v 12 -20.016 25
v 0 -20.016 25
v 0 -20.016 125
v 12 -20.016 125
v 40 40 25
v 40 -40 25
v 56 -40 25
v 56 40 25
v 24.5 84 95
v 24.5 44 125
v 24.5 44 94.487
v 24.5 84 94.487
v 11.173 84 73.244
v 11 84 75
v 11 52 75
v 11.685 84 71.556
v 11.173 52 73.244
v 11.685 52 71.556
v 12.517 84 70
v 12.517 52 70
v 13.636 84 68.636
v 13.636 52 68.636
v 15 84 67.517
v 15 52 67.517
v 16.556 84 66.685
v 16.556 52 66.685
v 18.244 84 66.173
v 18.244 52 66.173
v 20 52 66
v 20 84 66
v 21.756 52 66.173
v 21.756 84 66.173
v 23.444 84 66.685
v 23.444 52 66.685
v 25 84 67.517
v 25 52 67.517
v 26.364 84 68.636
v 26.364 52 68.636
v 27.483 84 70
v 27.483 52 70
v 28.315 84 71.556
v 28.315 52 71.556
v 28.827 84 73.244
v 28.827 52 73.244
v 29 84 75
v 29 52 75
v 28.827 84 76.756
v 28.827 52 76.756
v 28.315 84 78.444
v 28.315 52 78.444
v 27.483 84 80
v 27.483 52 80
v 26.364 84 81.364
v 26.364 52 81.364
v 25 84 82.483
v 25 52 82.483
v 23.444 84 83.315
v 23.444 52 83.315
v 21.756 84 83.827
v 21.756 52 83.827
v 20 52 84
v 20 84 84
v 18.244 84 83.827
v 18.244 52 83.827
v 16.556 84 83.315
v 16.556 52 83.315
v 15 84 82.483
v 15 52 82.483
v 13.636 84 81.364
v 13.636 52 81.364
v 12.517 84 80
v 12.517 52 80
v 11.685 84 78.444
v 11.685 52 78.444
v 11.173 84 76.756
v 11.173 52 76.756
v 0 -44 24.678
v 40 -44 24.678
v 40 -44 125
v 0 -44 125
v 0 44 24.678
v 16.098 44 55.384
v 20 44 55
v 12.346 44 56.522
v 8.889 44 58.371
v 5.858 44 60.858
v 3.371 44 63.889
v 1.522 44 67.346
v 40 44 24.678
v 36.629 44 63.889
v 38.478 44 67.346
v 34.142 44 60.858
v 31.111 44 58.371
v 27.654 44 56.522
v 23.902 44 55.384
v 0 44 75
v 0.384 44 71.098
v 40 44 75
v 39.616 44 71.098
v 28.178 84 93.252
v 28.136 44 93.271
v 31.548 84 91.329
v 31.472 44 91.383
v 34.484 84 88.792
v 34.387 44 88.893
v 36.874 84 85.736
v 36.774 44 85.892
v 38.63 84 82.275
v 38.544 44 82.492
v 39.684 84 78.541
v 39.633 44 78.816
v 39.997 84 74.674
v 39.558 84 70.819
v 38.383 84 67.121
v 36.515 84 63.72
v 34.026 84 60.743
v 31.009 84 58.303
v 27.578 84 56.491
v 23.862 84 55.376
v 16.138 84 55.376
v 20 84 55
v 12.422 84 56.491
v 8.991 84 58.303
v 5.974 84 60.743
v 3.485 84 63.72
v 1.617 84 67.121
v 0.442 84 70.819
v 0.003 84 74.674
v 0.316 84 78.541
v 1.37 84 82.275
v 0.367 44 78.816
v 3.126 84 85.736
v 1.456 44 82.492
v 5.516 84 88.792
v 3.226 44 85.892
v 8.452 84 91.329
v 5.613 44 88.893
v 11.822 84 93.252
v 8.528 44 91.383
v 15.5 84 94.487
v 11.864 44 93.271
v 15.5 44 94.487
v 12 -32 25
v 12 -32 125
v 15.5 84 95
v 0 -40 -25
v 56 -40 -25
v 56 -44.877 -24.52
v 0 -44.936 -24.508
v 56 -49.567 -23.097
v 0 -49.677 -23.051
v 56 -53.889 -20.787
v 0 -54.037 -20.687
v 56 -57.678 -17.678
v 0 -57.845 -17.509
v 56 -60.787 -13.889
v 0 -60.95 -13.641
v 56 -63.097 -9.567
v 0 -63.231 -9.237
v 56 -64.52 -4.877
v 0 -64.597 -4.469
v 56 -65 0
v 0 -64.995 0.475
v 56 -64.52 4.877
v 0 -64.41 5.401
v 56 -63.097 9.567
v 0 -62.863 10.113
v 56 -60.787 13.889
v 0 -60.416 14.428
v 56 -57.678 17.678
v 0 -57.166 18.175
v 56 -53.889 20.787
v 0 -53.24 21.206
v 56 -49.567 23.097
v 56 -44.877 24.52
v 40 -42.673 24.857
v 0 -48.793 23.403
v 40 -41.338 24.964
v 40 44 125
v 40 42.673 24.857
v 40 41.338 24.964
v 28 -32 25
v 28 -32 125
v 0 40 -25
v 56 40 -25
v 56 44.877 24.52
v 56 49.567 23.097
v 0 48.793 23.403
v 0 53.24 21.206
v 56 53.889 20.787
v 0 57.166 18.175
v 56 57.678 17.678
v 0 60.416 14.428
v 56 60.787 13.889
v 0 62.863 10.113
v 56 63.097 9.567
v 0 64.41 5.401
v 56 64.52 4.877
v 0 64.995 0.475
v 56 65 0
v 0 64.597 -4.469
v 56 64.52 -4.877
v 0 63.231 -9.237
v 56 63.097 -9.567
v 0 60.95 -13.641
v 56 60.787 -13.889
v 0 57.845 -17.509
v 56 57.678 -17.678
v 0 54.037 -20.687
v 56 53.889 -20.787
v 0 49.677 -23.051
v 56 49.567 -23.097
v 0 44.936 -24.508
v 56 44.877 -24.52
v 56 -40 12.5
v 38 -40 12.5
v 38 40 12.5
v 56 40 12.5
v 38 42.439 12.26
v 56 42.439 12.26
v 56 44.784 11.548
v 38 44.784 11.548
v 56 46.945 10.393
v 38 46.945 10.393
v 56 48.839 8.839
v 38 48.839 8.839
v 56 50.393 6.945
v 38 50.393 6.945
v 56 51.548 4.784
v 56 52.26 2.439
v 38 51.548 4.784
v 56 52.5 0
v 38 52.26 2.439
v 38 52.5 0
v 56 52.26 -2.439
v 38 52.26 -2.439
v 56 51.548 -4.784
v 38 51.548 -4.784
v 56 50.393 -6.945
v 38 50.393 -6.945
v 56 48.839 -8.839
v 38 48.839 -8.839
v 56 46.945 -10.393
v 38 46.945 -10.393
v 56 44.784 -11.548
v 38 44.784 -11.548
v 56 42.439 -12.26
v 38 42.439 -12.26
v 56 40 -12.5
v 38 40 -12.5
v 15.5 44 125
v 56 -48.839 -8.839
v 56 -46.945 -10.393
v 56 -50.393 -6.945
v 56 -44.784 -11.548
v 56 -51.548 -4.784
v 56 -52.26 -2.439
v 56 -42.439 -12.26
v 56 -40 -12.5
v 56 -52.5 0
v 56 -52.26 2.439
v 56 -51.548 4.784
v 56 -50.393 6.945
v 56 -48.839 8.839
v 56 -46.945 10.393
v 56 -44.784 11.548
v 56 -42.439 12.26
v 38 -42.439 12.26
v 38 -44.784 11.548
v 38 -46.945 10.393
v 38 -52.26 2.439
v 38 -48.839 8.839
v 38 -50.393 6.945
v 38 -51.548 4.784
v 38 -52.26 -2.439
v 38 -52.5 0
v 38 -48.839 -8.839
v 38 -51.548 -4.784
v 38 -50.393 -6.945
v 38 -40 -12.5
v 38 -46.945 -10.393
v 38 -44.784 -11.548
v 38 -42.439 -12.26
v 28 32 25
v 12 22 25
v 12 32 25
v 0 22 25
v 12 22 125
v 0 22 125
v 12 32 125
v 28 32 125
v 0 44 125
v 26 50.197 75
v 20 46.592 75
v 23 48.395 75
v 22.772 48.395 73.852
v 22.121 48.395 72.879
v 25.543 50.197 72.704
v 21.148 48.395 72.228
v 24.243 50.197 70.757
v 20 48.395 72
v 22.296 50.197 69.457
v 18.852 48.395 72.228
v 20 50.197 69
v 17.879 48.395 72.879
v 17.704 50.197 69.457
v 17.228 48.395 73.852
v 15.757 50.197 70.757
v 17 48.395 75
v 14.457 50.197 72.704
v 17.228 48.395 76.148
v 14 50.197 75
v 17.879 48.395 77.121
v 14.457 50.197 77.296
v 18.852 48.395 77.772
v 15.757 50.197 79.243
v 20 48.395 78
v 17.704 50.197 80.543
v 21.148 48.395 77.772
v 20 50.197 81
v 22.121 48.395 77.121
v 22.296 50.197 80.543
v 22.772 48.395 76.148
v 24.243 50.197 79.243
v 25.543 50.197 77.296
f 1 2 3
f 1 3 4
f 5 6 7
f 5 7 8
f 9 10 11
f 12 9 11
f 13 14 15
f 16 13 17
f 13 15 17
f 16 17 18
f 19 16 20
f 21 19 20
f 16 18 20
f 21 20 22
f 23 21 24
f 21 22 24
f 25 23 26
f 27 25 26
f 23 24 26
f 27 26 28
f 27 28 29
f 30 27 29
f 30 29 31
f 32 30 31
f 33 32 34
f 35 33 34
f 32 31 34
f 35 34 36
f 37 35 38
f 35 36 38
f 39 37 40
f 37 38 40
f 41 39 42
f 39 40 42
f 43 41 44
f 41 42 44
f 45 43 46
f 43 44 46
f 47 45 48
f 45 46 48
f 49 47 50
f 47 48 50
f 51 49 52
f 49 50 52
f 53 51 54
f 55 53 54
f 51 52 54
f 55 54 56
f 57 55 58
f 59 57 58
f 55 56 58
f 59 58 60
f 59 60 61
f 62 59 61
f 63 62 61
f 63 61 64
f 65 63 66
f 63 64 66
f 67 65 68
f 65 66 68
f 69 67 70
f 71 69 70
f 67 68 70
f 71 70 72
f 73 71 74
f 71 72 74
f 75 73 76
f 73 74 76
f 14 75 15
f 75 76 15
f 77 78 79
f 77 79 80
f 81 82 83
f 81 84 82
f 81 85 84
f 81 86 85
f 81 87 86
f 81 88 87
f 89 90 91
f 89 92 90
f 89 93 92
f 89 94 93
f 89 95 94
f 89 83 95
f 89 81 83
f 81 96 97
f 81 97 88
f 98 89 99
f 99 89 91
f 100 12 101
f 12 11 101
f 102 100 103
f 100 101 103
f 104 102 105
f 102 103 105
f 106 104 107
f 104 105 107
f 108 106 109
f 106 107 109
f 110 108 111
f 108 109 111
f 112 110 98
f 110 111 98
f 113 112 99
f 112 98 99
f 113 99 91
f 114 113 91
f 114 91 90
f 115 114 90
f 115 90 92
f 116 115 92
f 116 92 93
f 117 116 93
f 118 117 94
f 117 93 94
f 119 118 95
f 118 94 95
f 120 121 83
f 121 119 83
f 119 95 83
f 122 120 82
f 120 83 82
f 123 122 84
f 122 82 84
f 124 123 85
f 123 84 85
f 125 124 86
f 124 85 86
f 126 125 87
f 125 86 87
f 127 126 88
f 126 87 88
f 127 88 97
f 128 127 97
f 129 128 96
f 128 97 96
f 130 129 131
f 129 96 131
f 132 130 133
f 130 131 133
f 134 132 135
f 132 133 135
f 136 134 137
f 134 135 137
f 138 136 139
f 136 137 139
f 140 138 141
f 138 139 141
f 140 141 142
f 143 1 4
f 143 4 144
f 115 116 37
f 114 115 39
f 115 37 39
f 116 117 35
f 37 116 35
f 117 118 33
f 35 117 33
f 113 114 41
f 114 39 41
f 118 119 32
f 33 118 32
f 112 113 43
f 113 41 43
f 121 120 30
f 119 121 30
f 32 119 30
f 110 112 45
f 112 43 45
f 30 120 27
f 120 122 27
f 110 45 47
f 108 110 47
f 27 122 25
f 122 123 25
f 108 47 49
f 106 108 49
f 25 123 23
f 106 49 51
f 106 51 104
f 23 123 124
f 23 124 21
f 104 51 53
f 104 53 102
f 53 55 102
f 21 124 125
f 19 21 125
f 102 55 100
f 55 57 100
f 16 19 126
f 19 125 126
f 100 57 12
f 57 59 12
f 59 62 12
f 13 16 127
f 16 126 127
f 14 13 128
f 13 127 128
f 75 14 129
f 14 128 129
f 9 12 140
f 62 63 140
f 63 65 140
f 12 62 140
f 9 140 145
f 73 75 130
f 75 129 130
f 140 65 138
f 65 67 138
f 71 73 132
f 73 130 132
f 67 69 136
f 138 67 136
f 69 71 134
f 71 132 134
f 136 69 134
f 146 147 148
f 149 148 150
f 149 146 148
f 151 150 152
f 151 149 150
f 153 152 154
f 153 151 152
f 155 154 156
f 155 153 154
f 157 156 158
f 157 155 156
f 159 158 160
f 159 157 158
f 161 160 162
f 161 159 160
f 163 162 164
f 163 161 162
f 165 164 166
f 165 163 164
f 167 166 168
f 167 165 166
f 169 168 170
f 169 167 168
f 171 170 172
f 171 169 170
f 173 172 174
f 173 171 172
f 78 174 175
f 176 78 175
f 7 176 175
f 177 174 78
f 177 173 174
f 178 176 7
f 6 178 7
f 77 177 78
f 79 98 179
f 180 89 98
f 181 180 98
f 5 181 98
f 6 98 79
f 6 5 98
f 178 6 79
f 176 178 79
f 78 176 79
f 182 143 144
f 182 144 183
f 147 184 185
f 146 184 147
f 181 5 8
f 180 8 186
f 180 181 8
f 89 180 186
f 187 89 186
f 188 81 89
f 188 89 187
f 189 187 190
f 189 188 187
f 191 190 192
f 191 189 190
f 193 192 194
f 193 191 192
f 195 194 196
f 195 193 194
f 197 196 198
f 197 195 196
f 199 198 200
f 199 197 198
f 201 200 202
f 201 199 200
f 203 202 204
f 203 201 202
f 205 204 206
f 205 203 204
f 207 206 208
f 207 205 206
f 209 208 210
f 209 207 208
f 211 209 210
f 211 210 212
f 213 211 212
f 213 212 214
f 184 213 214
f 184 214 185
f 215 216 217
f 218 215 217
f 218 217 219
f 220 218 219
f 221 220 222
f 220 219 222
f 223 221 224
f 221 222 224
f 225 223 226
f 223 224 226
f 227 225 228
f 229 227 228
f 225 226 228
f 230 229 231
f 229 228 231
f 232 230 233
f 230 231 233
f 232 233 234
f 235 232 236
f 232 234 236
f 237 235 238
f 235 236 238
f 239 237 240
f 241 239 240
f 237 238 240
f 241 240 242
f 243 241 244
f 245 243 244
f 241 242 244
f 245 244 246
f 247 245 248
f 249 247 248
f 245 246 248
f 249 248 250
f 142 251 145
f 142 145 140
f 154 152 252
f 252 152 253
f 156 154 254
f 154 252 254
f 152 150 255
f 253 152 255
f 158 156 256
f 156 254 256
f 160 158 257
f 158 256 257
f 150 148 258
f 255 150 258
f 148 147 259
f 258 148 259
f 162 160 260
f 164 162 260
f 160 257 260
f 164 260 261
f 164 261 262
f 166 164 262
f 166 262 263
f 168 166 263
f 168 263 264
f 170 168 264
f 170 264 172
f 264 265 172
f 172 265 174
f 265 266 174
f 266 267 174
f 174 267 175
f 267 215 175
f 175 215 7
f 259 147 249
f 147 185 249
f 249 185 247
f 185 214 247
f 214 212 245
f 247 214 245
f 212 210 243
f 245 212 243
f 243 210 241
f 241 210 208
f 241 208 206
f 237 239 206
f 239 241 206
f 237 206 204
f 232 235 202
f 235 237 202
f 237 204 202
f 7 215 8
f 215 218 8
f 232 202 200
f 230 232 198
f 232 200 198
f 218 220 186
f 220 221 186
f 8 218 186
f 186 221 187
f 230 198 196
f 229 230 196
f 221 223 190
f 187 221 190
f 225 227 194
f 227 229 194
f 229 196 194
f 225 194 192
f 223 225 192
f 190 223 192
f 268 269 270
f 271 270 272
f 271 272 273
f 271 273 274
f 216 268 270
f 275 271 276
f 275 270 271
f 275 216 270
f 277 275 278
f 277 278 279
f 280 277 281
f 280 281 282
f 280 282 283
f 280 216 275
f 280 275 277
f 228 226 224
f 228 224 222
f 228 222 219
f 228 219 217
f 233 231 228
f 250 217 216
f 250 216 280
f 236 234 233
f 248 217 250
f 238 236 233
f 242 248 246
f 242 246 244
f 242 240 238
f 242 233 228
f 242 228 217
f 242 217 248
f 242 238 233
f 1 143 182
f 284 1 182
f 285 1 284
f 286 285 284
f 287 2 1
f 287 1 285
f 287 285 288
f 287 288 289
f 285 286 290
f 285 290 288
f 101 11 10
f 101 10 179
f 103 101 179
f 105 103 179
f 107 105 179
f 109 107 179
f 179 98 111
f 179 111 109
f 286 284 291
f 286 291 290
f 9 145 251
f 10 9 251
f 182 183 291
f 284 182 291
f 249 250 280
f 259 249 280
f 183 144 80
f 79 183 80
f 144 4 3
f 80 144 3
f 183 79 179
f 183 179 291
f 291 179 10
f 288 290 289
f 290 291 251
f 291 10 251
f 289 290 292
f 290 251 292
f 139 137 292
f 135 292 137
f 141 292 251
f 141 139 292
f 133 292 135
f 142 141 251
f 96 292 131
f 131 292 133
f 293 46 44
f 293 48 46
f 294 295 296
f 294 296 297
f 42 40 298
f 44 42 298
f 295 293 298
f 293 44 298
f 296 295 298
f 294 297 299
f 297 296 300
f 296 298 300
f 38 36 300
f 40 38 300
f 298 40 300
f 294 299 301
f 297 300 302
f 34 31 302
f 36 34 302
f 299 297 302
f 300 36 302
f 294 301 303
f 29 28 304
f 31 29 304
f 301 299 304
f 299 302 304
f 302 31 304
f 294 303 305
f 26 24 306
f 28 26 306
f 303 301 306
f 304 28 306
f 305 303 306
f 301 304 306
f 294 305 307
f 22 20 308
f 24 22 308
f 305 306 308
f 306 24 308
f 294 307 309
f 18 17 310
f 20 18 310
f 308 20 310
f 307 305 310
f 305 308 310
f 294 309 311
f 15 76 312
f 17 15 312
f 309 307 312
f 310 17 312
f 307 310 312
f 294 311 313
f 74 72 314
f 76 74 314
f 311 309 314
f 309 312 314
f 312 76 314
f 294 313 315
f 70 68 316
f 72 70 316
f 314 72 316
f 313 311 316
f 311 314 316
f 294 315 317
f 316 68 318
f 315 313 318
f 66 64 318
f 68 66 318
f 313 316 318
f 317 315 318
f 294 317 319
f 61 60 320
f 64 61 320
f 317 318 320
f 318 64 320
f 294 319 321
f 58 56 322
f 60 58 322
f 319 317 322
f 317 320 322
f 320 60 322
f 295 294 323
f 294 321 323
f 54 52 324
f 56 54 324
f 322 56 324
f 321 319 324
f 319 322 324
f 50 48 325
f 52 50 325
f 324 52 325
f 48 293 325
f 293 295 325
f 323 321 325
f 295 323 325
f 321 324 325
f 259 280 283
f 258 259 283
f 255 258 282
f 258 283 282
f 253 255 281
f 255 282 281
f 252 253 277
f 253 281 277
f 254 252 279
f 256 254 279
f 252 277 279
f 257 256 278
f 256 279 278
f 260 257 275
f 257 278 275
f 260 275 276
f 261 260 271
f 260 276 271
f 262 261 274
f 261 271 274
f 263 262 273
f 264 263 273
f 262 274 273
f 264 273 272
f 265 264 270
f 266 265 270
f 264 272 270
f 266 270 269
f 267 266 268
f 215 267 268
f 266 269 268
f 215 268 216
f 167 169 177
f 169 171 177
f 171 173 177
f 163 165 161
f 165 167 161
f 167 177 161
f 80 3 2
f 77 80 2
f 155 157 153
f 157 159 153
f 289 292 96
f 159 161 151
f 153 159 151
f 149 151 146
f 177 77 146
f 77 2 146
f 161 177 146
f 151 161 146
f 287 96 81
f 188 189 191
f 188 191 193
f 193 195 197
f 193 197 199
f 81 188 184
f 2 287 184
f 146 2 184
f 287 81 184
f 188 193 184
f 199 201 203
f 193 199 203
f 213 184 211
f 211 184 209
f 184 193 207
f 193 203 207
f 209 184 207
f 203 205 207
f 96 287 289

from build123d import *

# Parameters (mm, degrees)
BOSS_EXTRUDE1_DEPTH        = 56
BOSS_EXTRUDE2_DEPTH        = 38
BOSS_EXTRUDE3_START        = -0.322075
BOSS_EXTRUDE3_DEPTH        = 100.322075
SKETCH3_R                  = 20
BOSS_EXTRUDE4_DEPTH        = 40
RIB2_START                 = -4.5
RIB2_DEPTH                 = 9
F_10_0MM_DOWEL_HOLE1_D     = 18
F_10_0MM_DOWEL_HOLE1_DEPTH = 32
F_10_0MM_DOWEL_HOLE1_TIP   = 5.407745571


with BuildPart() as part:
    # Sketch1 → Boss-Extrude1 (new body)
    with BuildSketch(Plane(origin=(0, 0, 0), x_dir=(0, 0, -1), z_dir=(1, 0, 0))):
        with BuildLine():
            Line((-25, -40), (-25, 40))
            ThreePointArc((-25, 40), (0, 65), (25, 40))
            Line((25, 40), (25, -40))
            ThreePointArc((25, -40), (0, -65), (-25, -40))
        make_face()
        with BuildLine():
            Line((-12.5, -40), (-12.5, 40))
            ThreePointArc((-12.5, 40), (0, 52.5), (12.5, 40))
            Line((12.5, 40), (12.5, -40))
            ThreePointArc((12.5, -40), (0, -52.5), (-12.5, -40))
        make_face(mode=Mode.SUBTRACT)
    extrude(amount=BOSS_EXTRUDE1_DEPTH)

    # Sketch1<2> → Boss-Extrude2 (add)
    with BuildSketch(Plane(origin=(0, 0, 0), x_dir=(0, 0, -1), z_dir=(1, 0, 0))):
        with BuildLine():
            Line((12.5, -40), (12.5, 40))
            ThreePointArc((12.5, 40), (0, 52.5), (-12.5, 40))
            Line((-12.5, 40), (-12.5, -40))
            ThreePointArc((-12.5, -40), (0, -52.5), (12.5, -40))
        make_face()
    extrude(amount=BOSS_EXTRUDE2_DEPTH)

    # Sketch2 → Boss-Extrude3 (add)
    with BuildSketch(Plane.XY.offset(25).offset(BOSS_EXTRUDE3_START)):
        Polygon((0, 22), (0, 44), (40, 44), (40, -44), (0, -44), (0, -20.015625235), (12, -20.015625235), (12, -32), (28, -32), (28, 32), (12, 32), (12, 22), align=None)
    extrude(amount=BOSS_EXTRUDE3_DEPTH)

    # Sketch3 → Boss-Extrude4 (add)
    with BuildSketch(Plane(origin=(0, 44, 0), x_dir=(1, 0, 0), z_dir=(0, 1, 0))):
        with Locations(Location((20, -75, 0), (0, 0, 180))):
            Circle(SKETCH3_R)
    extrude(amount=BOSS_EXTRUDE4_DEPTH)

    # Rib2: read off the stored shape, not the designer's step
    # Rib2 outline → Rib2 (add)
    with BuildSketch(Plane(origin=(20, 0, 0), x_dir=(0, 0, -1), z_dir=(1, 0, 0)).offset(RIB2_START)):
        Polygon((-125, 44), (-94.48717527, 44), (-94.48717527, 84), (-95, 84), align=None)
    extrude(amount=RIB2_DEPTH)

    # Ø10.0mm Dowel Hole1
    with Locations(Plane(origin=(20, 84, 75), x_dir=(1, 0, 0), z_dir=(0, 1, 0))):
        with Locations((0, 0)):
            Hole(F_10_0MM_DOWEL_HOLE1_D / 2, depth=F_10_0MM_DOWEL_HOLE1_DEPTH)
            with Locations((0, 0, -(F_10_0MM_DOWEL_HOLE1_DEPTH + F_10_0MM_DOWEL_HOLE1_TIP / 2))):  # 118° drill point
                Cone(0, F_10_0MM_DOWEL_HOLE1_D / 2, F_10_0MM_DOWEL_HOLE1_TIP, mode=Mode.SUBTRACT)


solid = part.part
